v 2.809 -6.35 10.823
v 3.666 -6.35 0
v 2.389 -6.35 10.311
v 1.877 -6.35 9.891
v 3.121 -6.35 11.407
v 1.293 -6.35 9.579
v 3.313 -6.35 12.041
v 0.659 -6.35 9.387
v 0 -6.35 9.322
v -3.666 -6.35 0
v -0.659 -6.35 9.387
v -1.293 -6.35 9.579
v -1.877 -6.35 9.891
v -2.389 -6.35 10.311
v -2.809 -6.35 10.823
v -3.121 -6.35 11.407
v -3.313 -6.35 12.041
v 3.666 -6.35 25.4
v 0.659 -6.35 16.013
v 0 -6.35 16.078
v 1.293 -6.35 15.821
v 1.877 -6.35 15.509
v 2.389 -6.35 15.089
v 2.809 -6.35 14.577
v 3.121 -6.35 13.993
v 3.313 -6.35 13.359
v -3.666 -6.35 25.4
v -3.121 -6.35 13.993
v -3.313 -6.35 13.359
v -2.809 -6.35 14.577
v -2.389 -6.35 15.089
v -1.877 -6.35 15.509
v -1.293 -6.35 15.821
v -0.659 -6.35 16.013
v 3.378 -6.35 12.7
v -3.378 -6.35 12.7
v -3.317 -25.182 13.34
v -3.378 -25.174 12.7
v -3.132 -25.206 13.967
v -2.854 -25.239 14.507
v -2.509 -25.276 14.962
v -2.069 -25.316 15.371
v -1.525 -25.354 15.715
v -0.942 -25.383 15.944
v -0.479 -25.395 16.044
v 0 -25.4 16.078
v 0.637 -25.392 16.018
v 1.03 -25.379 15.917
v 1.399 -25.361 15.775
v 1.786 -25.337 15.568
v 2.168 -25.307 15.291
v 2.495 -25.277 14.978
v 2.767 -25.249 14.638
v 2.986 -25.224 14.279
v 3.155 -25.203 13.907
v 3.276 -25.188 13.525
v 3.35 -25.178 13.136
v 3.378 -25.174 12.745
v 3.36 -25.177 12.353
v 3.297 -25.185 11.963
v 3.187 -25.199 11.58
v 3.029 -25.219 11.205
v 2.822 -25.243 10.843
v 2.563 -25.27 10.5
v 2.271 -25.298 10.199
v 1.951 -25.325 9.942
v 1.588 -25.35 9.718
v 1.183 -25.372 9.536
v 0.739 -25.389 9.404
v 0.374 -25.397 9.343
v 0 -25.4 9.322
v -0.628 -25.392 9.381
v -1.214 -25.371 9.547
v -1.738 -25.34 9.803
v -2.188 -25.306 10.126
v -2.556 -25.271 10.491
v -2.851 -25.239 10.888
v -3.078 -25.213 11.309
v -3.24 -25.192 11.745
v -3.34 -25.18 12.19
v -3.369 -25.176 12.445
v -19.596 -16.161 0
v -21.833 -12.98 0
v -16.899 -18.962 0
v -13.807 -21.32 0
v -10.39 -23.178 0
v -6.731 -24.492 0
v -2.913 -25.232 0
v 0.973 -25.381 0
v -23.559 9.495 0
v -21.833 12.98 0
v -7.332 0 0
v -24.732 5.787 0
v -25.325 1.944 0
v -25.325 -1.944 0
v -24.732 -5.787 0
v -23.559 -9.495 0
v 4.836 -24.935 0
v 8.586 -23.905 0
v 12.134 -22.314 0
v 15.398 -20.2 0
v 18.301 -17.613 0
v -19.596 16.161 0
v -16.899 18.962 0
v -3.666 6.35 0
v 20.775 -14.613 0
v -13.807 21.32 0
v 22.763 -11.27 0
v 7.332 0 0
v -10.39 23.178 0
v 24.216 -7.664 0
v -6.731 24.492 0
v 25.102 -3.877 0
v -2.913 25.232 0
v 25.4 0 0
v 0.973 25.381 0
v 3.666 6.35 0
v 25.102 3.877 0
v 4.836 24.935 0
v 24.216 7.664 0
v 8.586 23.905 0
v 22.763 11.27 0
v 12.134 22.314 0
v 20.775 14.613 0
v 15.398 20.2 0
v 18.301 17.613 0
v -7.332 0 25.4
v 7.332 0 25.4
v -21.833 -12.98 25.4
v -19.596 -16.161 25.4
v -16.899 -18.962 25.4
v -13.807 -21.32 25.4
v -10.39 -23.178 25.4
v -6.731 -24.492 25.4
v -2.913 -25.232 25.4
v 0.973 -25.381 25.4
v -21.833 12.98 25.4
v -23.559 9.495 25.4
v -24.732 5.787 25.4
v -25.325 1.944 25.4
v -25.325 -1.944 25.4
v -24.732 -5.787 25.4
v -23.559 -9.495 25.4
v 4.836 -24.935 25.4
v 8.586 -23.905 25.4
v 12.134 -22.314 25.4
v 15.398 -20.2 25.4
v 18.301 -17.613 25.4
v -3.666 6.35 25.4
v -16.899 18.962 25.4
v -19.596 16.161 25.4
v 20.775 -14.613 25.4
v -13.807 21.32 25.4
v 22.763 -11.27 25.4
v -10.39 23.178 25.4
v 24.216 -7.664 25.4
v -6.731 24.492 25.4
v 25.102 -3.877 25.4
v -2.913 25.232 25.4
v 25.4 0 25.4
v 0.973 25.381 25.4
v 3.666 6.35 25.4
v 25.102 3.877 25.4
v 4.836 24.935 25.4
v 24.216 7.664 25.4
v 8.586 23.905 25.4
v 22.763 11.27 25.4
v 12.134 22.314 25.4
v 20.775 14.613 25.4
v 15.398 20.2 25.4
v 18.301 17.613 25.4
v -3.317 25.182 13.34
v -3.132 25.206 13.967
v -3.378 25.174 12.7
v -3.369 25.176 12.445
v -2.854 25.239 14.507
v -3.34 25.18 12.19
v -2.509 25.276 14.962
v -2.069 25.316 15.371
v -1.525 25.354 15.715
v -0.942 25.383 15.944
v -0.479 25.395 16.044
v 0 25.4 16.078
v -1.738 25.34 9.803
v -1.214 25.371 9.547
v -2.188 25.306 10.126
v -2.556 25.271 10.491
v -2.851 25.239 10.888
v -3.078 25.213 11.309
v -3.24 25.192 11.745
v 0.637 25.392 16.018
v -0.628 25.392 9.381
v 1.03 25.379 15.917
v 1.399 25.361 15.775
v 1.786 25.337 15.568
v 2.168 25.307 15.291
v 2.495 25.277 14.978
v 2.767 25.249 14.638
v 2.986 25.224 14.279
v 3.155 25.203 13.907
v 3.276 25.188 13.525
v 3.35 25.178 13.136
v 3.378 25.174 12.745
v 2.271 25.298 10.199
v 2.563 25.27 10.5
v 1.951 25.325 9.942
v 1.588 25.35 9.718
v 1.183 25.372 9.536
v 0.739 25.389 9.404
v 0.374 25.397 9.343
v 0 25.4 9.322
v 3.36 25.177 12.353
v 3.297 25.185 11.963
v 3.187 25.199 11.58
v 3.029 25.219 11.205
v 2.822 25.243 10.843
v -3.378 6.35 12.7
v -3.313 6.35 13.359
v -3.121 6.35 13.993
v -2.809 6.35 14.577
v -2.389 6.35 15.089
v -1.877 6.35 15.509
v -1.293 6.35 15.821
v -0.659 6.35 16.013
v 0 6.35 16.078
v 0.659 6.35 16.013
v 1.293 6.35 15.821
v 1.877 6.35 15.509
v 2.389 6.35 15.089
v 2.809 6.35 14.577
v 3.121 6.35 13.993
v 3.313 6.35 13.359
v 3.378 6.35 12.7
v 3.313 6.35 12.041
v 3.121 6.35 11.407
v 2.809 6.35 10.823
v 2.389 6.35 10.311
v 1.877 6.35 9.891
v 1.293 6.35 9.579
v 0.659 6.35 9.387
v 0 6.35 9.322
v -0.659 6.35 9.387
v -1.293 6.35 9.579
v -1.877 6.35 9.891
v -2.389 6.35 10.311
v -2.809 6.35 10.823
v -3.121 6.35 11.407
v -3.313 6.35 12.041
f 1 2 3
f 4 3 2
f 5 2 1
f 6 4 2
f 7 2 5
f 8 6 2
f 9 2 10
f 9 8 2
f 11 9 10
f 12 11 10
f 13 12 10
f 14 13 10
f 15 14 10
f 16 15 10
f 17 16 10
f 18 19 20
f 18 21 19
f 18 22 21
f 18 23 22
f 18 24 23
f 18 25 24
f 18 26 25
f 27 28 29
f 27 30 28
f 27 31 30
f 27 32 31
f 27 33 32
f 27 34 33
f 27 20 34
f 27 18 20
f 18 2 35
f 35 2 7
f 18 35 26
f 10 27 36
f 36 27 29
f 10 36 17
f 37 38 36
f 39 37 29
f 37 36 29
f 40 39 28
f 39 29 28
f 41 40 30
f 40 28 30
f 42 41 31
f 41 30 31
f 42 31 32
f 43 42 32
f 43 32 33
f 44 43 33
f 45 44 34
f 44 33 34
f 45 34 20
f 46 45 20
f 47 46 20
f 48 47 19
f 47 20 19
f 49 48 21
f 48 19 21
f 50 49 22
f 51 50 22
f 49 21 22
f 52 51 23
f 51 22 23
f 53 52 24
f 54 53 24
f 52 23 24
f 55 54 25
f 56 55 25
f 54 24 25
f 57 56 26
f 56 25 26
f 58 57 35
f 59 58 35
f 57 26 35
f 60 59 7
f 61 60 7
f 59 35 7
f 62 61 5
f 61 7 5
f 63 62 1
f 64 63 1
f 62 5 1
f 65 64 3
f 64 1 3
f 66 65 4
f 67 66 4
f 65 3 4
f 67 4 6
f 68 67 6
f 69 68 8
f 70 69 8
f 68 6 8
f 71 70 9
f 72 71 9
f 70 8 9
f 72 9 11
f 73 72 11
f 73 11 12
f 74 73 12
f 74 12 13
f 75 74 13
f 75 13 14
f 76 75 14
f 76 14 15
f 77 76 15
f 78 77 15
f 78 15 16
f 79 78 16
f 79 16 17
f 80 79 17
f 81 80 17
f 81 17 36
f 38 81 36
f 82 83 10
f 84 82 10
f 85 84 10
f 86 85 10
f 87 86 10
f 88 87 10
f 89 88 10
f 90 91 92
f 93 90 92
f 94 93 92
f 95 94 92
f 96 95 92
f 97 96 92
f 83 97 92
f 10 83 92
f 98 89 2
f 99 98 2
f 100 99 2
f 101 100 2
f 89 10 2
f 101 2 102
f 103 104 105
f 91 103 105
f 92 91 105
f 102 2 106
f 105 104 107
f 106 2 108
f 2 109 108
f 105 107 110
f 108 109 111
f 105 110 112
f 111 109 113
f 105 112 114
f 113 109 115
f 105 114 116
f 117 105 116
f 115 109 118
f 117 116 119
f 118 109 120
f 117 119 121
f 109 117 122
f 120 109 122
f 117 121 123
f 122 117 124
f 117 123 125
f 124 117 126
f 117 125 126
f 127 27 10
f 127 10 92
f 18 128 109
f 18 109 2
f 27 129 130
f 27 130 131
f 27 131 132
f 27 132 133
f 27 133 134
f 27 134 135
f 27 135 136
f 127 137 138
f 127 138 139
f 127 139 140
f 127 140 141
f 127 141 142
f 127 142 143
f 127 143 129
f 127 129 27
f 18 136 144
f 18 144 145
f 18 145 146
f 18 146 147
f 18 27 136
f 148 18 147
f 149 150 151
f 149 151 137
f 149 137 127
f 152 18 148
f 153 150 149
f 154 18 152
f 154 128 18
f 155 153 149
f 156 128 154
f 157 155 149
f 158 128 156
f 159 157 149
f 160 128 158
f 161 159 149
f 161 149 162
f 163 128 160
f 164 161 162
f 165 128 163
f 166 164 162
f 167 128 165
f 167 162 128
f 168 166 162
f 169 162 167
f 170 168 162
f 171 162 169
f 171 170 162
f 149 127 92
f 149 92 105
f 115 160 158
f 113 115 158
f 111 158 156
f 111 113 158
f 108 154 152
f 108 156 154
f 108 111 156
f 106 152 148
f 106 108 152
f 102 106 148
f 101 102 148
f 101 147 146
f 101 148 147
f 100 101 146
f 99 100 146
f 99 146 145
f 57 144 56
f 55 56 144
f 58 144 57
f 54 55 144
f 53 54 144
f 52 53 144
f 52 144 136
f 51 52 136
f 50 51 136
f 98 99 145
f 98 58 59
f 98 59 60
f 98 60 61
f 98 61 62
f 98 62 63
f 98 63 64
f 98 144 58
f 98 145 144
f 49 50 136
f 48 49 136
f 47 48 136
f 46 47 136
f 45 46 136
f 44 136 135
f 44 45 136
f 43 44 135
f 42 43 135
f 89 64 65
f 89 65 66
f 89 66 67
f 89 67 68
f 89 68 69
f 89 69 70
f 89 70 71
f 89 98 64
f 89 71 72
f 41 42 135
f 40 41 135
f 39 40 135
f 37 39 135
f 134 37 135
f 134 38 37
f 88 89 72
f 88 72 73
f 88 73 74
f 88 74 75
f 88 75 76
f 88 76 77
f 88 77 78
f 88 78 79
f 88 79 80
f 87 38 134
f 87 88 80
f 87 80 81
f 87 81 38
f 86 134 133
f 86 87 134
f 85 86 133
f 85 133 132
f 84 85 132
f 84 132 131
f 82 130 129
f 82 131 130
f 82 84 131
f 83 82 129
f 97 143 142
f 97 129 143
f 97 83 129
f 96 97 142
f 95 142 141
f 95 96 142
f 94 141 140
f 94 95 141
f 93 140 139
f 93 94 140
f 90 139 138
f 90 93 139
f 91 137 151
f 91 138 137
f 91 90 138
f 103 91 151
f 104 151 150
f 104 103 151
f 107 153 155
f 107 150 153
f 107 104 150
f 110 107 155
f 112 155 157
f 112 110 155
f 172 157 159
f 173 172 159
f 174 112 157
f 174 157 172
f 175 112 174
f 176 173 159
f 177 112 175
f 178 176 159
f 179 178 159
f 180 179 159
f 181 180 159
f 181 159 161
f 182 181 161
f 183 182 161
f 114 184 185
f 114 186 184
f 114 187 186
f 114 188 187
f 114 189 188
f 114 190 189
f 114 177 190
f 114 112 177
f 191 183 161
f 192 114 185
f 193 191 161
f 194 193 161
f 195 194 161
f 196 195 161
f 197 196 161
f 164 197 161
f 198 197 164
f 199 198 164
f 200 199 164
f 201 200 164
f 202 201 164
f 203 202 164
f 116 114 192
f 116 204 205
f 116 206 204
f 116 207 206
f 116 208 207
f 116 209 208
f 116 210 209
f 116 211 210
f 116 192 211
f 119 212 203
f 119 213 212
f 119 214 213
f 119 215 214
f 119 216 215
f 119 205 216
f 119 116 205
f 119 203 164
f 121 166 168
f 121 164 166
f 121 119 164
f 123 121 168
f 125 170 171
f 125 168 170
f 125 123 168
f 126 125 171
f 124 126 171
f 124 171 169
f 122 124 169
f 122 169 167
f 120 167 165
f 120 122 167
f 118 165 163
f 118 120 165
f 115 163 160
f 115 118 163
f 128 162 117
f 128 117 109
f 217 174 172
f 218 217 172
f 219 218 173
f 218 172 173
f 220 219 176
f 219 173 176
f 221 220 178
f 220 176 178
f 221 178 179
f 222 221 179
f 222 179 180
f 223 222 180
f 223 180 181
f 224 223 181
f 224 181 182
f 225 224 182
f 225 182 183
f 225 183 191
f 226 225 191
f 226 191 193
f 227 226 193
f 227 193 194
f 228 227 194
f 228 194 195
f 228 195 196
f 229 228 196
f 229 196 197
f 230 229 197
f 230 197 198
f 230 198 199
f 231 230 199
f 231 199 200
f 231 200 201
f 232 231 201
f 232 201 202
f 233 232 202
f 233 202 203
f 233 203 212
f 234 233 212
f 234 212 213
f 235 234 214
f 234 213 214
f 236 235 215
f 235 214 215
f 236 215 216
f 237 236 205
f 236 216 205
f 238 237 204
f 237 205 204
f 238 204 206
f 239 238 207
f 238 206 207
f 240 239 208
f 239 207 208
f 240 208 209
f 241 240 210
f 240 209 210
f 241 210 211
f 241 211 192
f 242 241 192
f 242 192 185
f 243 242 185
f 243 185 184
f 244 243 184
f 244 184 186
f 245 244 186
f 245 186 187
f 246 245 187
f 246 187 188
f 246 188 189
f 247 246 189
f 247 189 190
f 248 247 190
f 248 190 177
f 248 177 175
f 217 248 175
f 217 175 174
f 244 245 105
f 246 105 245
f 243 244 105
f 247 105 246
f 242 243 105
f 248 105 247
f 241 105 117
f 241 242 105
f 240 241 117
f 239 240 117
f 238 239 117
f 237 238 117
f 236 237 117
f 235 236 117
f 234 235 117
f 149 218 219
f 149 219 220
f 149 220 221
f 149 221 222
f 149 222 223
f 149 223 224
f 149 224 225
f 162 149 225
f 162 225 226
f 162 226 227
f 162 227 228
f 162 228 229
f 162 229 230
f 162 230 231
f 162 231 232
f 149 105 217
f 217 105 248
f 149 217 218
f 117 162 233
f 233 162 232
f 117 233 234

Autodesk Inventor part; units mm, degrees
ref_plane "YZ Plane" through (0, 0, 0) normal (1, 0, 0) x (0, 1, 0)
ref_plane "XY Plane" through (0, 0, 0) normal (0, 0, 1) x (1, 0, 0)
sketch "Sketch1" plane through (0, 0, 0) normal (0, 0, 1) x (1, 0, 0)
  circle A0 centre (0, 0) radius 25.4
  dimension "d0" = 50.8
extrude "Extrusion1" add sketch "Sketch1" along normal blind 25.4
ref_plane "Work Plane1" through (0, 25.4, 0) normal (0, 1, 0) x (-1, 0, 0)
sketch "Sketch2" plane through (0, 25.4, 0) normal (0, 1, 0) x (-1, 0, 0)
  line L0 (0, 0) -> (0, 12.7)
  circle A0 centre (0, 12.7) radius 3.3782
  dimension "d3" = 12.7
  dimension "d4" = 6.7564
extrude "Extrusion2" cut sketch "Sketch2" against normal blind 50.8
sketch "Sketch3" plane through (0, 0, 25.4) normal (0, 0, 1) x (1, 0, 0)
  circle A0 centre (0, 0) radius 25.4 projected
  circle A1 centre (0, 0) radius 6.35
  line L0 (3.6662, 6.35) -> (7.3323, 0)
  line L1 (7.3323, 0) -> (3.6662, -6.35)
  line L2 (3.6662, -6.35) -> (-3.6662, -6.35)
  line L3 (-3.6662, -6.35) -> (-7.3323, 0)
  line L4 (-7.3323, 0) -> (-3.6662, 6.35)
  line L5 (-3.6662, 6.35) -> (3.6662, 6.35)
  point P0 (0, 6.35)
  dimension "d7" = 12.7
extrude "Extrusion3" cut sketch "Sketch3" against normal blind 50.8 contours A1 | A1 L0 L1 | A1 L5 L0 | L1 L2 A1 | A1 L4 L5 | L2 L3 A1 | A1 L3 L4
properties part number "insert" material "Aluminum 6061"
